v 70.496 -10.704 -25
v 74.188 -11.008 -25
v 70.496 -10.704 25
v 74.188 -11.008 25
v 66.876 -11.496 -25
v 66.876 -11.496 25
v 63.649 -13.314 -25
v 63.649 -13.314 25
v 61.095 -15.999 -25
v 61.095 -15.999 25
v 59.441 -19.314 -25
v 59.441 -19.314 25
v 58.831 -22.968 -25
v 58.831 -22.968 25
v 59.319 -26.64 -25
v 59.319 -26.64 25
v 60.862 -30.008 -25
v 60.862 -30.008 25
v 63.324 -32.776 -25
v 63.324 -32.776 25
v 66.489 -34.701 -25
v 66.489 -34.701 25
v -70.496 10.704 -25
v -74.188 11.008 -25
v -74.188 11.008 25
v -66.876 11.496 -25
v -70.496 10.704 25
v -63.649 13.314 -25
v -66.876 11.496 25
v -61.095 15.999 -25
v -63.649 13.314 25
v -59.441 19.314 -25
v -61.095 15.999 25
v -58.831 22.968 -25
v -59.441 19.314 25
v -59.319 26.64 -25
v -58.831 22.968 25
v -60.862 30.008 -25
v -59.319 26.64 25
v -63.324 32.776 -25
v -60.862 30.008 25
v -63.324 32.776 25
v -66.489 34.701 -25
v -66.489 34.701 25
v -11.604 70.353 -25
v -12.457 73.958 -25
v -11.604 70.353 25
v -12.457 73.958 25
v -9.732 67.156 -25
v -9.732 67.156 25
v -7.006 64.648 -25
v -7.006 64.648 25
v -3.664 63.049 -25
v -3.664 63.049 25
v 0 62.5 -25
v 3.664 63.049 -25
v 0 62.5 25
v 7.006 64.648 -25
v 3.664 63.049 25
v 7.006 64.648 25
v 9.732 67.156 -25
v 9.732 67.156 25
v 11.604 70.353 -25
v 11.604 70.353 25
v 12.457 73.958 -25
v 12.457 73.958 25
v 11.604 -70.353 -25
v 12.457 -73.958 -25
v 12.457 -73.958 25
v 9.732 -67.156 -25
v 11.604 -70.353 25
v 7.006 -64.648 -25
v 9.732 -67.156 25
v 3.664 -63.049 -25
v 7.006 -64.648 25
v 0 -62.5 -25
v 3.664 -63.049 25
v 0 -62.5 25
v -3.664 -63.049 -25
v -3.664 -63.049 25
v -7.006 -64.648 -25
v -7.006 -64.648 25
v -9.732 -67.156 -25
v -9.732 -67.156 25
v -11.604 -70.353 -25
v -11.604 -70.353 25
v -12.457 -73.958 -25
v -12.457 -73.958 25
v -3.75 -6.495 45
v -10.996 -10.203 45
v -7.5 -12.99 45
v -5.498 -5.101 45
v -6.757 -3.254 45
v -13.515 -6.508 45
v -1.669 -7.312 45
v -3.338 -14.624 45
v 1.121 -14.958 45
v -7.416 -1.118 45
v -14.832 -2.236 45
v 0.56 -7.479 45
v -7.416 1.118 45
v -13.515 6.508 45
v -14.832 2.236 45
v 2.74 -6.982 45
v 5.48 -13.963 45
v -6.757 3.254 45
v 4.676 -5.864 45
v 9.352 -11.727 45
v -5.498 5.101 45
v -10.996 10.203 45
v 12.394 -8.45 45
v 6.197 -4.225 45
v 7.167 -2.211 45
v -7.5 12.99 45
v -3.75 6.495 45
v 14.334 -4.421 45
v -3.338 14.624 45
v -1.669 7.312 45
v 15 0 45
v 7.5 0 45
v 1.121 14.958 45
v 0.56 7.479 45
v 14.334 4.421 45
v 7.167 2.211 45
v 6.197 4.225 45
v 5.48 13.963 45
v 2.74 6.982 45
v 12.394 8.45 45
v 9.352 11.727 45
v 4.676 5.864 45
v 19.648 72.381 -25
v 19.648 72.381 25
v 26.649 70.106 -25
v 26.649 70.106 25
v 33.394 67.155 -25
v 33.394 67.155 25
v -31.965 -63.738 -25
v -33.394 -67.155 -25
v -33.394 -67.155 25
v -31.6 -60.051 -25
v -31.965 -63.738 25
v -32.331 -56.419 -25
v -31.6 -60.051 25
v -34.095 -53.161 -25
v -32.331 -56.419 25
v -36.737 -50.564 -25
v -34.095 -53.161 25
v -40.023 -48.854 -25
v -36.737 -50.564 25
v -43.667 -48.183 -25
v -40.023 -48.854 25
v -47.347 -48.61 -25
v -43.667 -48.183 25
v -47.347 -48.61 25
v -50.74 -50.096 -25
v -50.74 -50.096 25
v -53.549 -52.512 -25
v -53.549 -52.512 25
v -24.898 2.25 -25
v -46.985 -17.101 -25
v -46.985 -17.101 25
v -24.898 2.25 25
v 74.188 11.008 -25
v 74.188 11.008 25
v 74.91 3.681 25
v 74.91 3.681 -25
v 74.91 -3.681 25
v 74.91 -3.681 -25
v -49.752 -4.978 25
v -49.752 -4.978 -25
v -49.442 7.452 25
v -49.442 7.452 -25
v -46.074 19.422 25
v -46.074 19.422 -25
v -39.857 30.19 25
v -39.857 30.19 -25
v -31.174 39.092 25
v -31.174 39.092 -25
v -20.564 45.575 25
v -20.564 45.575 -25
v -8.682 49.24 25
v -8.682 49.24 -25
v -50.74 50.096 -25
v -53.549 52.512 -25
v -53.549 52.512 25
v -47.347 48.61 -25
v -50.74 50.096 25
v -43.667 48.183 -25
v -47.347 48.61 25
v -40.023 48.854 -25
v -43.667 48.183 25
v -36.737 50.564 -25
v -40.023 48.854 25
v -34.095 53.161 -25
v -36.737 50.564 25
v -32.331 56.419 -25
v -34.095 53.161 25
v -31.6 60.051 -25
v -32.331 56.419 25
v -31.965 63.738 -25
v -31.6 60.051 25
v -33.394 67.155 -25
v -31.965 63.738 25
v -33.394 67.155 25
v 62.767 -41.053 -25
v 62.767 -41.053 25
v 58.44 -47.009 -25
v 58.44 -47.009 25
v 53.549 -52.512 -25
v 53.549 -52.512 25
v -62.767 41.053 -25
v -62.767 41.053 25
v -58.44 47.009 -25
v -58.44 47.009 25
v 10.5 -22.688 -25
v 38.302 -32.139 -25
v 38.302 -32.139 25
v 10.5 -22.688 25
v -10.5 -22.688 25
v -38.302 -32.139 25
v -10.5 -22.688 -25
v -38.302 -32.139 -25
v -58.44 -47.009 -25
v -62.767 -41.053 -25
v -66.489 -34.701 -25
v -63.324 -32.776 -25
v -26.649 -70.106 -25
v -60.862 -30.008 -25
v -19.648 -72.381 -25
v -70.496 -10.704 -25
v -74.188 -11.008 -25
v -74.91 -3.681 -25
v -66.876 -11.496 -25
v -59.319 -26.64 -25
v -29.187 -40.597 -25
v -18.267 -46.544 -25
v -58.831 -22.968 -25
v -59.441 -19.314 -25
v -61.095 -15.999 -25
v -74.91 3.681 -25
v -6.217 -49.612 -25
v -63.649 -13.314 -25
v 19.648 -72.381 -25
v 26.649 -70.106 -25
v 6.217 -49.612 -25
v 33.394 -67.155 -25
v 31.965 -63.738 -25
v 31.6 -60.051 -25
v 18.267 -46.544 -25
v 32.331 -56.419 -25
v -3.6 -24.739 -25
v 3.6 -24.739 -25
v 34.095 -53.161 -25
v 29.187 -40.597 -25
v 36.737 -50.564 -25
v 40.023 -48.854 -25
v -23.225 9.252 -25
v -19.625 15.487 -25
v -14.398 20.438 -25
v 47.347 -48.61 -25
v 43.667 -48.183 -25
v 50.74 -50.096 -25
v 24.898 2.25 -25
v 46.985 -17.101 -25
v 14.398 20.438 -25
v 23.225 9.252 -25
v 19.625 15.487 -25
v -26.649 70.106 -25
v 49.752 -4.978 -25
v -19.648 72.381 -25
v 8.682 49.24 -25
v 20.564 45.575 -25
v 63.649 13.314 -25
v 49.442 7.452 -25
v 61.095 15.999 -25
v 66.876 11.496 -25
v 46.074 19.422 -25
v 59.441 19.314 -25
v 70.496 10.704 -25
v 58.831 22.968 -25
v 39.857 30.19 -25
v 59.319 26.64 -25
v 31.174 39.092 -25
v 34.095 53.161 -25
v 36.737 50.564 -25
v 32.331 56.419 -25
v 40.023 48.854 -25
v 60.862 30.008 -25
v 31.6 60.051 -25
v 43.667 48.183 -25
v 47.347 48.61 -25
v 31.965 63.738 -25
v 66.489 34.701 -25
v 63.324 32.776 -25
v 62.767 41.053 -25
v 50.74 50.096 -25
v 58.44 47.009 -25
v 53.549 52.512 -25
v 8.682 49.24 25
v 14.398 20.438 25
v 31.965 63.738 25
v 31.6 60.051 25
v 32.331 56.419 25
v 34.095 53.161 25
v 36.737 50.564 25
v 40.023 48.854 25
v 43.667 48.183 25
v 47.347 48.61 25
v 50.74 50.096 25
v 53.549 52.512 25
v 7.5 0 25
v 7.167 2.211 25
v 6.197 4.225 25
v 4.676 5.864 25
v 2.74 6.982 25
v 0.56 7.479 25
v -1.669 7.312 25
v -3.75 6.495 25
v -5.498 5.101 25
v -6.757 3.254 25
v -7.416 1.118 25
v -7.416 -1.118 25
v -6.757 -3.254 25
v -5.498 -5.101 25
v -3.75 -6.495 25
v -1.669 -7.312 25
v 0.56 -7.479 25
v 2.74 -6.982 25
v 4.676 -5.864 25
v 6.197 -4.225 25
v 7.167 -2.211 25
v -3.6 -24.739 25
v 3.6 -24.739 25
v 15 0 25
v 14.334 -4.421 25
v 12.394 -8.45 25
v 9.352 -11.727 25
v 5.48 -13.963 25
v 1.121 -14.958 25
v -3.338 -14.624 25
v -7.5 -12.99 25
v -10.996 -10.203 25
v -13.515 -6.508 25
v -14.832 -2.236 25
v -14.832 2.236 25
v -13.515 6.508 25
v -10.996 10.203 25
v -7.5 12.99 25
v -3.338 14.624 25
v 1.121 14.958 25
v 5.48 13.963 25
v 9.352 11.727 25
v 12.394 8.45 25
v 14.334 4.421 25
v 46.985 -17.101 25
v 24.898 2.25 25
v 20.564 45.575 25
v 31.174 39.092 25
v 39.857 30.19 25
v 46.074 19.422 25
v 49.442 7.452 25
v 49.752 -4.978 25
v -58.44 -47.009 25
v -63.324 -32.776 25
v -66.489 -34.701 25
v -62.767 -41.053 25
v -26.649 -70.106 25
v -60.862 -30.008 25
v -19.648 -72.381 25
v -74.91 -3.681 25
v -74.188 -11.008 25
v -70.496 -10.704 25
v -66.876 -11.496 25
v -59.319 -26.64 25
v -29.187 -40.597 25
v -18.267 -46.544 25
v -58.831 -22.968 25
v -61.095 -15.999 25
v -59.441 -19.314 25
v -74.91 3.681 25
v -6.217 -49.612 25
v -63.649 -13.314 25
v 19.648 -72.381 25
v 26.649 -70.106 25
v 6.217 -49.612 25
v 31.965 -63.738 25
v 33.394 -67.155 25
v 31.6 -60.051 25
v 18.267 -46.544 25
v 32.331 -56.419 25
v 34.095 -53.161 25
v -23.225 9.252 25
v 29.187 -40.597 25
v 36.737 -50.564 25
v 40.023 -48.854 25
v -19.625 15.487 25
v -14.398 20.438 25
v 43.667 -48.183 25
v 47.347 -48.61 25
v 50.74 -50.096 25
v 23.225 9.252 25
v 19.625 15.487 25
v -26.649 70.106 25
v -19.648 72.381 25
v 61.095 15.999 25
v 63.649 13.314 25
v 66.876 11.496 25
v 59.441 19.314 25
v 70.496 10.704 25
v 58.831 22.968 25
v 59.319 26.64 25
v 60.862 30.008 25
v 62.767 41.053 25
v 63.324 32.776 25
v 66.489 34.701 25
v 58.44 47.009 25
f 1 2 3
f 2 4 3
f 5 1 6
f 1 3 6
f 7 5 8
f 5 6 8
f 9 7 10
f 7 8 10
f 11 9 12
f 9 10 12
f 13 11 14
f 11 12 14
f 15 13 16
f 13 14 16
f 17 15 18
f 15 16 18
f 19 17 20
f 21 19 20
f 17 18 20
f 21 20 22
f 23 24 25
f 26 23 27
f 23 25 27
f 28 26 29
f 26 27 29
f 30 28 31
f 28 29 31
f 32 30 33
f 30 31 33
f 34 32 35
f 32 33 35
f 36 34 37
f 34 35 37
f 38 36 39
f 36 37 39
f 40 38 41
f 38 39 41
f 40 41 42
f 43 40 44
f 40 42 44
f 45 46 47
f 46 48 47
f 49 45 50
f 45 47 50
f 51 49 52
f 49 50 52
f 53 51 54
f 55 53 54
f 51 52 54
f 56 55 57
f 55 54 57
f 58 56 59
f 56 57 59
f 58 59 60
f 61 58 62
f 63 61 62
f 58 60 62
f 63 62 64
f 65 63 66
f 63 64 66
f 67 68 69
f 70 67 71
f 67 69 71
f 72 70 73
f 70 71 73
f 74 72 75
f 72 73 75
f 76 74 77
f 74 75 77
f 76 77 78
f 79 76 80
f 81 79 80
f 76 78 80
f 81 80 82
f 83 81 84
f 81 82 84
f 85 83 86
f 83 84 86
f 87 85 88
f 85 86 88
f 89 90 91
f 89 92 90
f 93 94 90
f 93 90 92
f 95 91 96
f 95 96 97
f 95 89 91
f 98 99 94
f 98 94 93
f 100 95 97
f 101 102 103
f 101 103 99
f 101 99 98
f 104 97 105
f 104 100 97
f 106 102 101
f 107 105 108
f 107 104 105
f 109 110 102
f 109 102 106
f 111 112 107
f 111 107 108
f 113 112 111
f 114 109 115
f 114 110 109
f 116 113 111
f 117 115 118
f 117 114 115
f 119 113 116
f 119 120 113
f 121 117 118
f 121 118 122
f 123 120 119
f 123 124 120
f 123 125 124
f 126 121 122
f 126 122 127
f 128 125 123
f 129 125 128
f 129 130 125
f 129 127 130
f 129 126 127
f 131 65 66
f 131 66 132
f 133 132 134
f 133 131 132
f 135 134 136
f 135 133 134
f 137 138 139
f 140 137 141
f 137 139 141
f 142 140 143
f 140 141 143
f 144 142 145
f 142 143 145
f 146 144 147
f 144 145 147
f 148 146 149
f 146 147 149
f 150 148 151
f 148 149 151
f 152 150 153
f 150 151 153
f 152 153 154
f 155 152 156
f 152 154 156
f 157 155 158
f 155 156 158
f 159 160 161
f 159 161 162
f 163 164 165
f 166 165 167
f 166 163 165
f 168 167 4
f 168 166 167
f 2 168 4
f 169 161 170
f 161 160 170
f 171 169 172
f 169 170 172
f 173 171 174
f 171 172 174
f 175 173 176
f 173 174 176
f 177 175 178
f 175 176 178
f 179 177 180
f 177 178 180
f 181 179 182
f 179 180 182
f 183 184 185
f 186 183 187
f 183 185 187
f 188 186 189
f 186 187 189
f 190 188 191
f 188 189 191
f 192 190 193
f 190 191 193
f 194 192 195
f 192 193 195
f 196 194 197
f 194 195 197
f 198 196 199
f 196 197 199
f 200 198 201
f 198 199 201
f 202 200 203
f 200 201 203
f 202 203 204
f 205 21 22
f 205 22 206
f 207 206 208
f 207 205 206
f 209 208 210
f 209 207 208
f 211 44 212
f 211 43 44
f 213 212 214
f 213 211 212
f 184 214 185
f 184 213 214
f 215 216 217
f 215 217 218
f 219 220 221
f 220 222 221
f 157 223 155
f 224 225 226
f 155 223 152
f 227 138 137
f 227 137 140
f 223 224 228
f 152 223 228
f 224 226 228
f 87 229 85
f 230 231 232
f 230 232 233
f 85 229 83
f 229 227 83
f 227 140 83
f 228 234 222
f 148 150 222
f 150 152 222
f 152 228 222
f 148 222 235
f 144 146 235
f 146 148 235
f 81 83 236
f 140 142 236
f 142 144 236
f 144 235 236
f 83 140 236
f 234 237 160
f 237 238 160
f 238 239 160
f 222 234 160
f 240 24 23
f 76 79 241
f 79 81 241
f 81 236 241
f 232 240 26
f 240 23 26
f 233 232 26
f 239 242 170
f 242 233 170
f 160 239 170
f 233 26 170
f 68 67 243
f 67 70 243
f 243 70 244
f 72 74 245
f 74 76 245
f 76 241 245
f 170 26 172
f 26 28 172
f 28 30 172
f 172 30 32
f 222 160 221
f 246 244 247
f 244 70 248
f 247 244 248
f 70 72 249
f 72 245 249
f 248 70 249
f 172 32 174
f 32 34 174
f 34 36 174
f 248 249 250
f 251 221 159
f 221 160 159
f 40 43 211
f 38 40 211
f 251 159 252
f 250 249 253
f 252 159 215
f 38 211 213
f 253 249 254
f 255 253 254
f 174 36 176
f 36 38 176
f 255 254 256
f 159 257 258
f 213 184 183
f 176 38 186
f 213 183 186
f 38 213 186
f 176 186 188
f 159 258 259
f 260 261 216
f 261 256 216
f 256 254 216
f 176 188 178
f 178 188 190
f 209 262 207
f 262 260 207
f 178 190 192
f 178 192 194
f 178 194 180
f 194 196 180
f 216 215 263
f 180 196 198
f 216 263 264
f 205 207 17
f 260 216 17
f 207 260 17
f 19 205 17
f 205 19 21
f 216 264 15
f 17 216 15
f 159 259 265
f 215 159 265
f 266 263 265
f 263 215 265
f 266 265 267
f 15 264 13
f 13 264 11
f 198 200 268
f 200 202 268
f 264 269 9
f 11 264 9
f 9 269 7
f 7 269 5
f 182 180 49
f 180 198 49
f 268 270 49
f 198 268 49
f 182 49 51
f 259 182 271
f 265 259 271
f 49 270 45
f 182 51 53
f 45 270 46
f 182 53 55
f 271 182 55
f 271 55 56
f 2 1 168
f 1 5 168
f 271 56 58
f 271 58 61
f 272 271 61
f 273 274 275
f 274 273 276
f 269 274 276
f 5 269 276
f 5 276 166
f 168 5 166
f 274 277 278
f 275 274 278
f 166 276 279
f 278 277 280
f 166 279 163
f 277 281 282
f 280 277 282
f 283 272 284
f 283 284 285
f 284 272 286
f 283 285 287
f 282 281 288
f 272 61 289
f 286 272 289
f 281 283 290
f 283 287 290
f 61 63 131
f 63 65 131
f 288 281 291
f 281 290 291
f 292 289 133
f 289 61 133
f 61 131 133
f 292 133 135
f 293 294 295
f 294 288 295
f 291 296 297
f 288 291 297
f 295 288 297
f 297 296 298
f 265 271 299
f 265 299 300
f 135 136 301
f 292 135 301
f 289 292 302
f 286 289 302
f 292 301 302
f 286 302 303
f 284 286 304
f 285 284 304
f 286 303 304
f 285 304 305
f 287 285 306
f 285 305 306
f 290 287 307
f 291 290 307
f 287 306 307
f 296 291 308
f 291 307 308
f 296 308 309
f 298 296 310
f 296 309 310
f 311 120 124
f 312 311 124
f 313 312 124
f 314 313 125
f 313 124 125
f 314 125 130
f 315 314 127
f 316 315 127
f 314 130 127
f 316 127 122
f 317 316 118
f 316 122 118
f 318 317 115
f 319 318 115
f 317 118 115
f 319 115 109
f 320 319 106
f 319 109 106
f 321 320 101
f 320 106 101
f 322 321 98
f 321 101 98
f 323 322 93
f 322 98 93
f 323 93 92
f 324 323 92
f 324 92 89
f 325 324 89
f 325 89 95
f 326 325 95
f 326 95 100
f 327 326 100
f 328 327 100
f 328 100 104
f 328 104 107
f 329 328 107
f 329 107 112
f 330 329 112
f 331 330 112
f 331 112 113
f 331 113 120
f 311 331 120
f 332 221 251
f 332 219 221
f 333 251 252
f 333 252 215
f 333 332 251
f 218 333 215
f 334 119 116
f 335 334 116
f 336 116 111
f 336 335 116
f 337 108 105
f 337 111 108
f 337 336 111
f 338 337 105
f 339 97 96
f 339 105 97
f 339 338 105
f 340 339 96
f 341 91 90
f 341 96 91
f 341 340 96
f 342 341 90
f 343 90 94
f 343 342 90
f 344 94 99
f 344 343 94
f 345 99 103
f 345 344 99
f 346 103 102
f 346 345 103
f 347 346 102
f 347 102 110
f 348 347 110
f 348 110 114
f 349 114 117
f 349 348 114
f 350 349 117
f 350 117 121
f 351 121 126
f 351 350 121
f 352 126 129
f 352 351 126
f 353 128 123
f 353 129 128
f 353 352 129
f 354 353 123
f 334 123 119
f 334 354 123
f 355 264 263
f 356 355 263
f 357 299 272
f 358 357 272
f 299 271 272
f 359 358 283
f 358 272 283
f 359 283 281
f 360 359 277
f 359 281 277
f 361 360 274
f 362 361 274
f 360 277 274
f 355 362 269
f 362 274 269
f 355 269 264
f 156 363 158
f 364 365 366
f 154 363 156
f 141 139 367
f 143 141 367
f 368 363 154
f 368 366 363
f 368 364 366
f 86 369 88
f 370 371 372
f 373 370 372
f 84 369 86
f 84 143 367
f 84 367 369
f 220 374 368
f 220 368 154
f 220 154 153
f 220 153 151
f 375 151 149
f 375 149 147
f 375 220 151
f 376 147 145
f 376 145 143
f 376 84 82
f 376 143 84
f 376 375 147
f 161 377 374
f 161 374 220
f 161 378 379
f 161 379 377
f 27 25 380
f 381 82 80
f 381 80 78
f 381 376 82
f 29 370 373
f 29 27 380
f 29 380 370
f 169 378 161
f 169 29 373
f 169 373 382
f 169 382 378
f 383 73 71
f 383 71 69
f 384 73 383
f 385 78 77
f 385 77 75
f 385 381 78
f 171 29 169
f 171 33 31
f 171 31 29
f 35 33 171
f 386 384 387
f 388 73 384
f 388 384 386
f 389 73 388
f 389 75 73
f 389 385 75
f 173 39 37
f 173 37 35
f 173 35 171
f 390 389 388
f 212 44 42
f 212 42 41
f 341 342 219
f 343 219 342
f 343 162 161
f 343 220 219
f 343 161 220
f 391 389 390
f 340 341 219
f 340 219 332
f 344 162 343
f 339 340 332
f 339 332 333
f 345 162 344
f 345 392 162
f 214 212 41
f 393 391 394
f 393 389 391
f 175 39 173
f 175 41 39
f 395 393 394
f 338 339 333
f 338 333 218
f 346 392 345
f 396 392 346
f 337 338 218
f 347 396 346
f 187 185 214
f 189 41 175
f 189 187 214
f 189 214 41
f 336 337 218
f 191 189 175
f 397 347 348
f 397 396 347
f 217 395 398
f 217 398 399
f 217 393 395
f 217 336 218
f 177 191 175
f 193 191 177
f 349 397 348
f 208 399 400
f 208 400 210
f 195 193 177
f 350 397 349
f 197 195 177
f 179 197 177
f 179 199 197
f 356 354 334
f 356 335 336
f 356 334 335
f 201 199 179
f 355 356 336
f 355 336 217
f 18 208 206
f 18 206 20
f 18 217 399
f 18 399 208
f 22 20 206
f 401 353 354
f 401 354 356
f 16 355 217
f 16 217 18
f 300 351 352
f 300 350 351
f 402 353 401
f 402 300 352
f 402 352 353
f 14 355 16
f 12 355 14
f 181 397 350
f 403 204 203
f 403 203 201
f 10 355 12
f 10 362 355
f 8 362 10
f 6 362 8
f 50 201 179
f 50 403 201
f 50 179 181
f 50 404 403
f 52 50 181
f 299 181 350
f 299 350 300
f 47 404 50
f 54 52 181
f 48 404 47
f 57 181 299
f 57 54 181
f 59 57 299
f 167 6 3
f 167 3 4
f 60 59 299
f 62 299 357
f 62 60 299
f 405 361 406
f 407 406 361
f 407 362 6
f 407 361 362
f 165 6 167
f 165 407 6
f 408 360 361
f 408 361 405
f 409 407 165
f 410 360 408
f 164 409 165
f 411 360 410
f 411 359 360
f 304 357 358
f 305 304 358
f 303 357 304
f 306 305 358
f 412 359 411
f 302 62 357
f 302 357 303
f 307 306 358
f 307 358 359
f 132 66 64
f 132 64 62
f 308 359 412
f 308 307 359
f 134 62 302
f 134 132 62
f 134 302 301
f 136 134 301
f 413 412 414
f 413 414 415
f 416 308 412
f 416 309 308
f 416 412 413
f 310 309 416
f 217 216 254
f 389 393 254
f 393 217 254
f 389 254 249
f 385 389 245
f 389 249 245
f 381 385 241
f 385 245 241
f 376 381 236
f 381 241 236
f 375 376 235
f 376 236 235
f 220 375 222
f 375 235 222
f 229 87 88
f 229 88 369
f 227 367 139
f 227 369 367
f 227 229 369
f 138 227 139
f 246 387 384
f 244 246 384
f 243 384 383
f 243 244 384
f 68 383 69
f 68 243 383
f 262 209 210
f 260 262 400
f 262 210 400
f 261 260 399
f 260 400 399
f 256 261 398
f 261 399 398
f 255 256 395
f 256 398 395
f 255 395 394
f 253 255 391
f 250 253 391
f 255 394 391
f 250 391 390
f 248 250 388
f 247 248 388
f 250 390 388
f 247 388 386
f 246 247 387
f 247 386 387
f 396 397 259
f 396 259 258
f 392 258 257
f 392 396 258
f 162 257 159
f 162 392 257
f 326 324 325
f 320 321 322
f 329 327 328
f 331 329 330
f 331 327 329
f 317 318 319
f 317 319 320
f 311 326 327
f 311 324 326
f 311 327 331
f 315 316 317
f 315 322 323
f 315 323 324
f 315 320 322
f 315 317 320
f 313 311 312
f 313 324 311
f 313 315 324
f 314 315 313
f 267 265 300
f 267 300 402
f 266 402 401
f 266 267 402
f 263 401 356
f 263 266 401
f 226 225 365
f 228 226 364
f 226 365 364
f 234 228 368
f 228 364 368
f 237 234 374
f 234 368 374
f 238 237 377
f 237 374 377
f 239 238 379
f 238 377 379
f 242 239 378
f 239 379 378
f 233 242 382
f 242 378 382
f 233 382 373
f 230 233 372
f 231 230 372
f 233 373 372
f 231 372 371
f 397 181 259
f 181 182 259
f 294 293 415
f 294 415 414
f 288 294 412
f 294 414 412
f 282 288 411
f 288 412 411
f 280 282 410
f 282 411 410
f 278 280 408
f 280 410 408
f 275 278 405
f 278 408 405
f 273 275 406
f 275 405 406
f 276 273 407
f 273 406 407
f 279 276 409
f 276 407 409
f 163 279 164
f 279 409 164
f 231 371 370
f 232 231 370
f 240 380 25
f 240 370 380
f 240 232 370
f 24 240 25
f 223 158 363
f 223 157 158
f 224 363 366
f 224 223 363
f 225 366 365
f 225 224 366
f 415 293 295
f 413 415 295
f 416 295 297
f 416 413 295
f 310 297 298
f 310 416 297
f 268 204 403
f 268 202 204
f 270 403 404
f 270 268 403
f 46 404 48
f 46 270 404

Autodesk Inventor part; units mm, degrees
ref_plane "YZ Plane" through (0, 0, 0) normal (1, 0, 0) x (0, 1, 0)
ref_plane "XZ Plane" through (0, 0, 0) normal (0, 1, 0) x (-1, 0, 0)
ref_plane "XY Plane" through (0, 0, 0) normal (0, 0, 1) x (1, 0, 0)
sketch "Sketch1" plane through (0, 0, 0) normal (0, 0, 1) x (1, 0, 0)
  circle A0 centre (0, 0) radius 75
  dimension "d0" = 150
extrude "Extrusion1" add sketch "Sketch1" along normal mid plane 50
sketch "Sketch2" plane through (0, 0, 0) normal (0, 0, 1) x (1, 0, 0)
  circle A0 centre (0, 0) radius 50
  dimension "d3" = 100
extrude "Extrusion2" cut sketch "Sketch2" along normal mid plane 50
sketch "Sketch3" plane through (0, 0, 0) normal (0, 0, 1) x (1, 0, 0)
  circle A0 centre (0, 0) radius 25
  dimension "d6" = 50
extrude "Extrusion3" add sketch "Sketch3" along normal mid plane 50
sketch "Sketch10" plane through (0, 0, 25) normal (0, 0, 1) x (1, 0, 0)
  circle A0 centre (0, 0) radius 75 projected
  circle A1 centre (0, 75) radius 12.5
  circle A2 centre (-44.0839, 60.6763) radius 12.5
  circle A3 centre (-71.3292, 23.1763) radius 12.5
  circle A4 centre (-71.3292, -23.1763) radius 12.5
  circle A5 centre (-44.0839, -60.6763) radius 12.5
  circle A6 centre (0, -75) radius 12.5
  circle A7 centre (44.0839, -60.6763) radius 12.5
  circle A8 centre (71.3292, -23.1763) radius 12.5
  circle A9 centre (71.3292, 23.1763) radius 12.5
  circle A10 centre (44.0839, 60.6763) radius 12.5
  dimension "d46" = 25
  dimension "d49" = 360
extrude "Extrusion9" cut sketch "Sketch10" against normal through all contours A9 A0 | A0 A9 | A8 A0 | A0 A8 | A10 A0 | A0 A10 | A7 A0 | A0 A7 | A1 A0 | A0 A1 | A6 A0 | A0 A6 | A2 A0 | A0 A2 | A5 A0 | A0 A5 | A3 A0 | A0 A3 | A4 A0 | A0 A4
sketch "Sketch11" plane through (0, 0, 0) normal (0, 0, 1) x (1, 0, 0)
  circle A0 centre (0, 0) radius 25 construction
  circle A1 centre (0, 0) radius 50 construction
  line L0 (0, 0) -> (50, 0) construction
  line L1 (-8.6824, 49.2404) -> (-14.3982, 20.4375)
  line L2 (8.6824, 49.2404) -> (14.3982, 20.4375)
  line L3 (-38.3022, -32.1394) -> (-10.5003, -22.6879)
  line L4 (-46.9846, -17.101) -> (-24.8985, 2.2504)
  line L5 (46.9846, -17.101) -> (24.8985, 2.2504)
  line L6 (38.3022, -32.1394) -> (10.5003, -22.6879)
  arc A2 (8.6824, 49.2404) -> (-8.6824, 49.2404) centre (0, 0) ccw
  arc A3 (-46.9846, -17.101) -> (-38.3022, -32.1394) centre (0, 0) ccw
  arc A4 (38.3022, -32.1394) -> (50, 0) centre (0, 0) ccw
  arc A5 (10.5003, -22.6879) -> (24.8985, 2.2504) centre (0, 0) ccw
  arc A6 (14.3982, 20.4375) -> (-14.3982, 20.4375) centre (0, 0) ccw
  arc A7 (-24.8985, 2.2504) -> (-10.5003, -22.6879) centre (0, 0) ccw
  dimension "d56" = 360
extrude "Extrusion10" add sketch "Sketch11" along normal mid plane 50
sketch "Sketch12" plane through (0, 0, 25) normal (0, 0, 1) x (1, 0, 0)
  circle A0 centre (0, 0) radius 15
  dimension "d60" = 30
extrude "Extrusion11" add sketch "Sketch12" along normal blind 20
sketch "Sketch13" plane through (0, 0, 45) normal (0, 0, 1) x (1, 0, 0)
  circle A0 centre (0, 0) radius 7.5
  dimension "d63" = 15
extrude "Extrusion12" cut sketch "Sketch13" against normal blind 20
properties part number "Guntas_Wheel_New"
